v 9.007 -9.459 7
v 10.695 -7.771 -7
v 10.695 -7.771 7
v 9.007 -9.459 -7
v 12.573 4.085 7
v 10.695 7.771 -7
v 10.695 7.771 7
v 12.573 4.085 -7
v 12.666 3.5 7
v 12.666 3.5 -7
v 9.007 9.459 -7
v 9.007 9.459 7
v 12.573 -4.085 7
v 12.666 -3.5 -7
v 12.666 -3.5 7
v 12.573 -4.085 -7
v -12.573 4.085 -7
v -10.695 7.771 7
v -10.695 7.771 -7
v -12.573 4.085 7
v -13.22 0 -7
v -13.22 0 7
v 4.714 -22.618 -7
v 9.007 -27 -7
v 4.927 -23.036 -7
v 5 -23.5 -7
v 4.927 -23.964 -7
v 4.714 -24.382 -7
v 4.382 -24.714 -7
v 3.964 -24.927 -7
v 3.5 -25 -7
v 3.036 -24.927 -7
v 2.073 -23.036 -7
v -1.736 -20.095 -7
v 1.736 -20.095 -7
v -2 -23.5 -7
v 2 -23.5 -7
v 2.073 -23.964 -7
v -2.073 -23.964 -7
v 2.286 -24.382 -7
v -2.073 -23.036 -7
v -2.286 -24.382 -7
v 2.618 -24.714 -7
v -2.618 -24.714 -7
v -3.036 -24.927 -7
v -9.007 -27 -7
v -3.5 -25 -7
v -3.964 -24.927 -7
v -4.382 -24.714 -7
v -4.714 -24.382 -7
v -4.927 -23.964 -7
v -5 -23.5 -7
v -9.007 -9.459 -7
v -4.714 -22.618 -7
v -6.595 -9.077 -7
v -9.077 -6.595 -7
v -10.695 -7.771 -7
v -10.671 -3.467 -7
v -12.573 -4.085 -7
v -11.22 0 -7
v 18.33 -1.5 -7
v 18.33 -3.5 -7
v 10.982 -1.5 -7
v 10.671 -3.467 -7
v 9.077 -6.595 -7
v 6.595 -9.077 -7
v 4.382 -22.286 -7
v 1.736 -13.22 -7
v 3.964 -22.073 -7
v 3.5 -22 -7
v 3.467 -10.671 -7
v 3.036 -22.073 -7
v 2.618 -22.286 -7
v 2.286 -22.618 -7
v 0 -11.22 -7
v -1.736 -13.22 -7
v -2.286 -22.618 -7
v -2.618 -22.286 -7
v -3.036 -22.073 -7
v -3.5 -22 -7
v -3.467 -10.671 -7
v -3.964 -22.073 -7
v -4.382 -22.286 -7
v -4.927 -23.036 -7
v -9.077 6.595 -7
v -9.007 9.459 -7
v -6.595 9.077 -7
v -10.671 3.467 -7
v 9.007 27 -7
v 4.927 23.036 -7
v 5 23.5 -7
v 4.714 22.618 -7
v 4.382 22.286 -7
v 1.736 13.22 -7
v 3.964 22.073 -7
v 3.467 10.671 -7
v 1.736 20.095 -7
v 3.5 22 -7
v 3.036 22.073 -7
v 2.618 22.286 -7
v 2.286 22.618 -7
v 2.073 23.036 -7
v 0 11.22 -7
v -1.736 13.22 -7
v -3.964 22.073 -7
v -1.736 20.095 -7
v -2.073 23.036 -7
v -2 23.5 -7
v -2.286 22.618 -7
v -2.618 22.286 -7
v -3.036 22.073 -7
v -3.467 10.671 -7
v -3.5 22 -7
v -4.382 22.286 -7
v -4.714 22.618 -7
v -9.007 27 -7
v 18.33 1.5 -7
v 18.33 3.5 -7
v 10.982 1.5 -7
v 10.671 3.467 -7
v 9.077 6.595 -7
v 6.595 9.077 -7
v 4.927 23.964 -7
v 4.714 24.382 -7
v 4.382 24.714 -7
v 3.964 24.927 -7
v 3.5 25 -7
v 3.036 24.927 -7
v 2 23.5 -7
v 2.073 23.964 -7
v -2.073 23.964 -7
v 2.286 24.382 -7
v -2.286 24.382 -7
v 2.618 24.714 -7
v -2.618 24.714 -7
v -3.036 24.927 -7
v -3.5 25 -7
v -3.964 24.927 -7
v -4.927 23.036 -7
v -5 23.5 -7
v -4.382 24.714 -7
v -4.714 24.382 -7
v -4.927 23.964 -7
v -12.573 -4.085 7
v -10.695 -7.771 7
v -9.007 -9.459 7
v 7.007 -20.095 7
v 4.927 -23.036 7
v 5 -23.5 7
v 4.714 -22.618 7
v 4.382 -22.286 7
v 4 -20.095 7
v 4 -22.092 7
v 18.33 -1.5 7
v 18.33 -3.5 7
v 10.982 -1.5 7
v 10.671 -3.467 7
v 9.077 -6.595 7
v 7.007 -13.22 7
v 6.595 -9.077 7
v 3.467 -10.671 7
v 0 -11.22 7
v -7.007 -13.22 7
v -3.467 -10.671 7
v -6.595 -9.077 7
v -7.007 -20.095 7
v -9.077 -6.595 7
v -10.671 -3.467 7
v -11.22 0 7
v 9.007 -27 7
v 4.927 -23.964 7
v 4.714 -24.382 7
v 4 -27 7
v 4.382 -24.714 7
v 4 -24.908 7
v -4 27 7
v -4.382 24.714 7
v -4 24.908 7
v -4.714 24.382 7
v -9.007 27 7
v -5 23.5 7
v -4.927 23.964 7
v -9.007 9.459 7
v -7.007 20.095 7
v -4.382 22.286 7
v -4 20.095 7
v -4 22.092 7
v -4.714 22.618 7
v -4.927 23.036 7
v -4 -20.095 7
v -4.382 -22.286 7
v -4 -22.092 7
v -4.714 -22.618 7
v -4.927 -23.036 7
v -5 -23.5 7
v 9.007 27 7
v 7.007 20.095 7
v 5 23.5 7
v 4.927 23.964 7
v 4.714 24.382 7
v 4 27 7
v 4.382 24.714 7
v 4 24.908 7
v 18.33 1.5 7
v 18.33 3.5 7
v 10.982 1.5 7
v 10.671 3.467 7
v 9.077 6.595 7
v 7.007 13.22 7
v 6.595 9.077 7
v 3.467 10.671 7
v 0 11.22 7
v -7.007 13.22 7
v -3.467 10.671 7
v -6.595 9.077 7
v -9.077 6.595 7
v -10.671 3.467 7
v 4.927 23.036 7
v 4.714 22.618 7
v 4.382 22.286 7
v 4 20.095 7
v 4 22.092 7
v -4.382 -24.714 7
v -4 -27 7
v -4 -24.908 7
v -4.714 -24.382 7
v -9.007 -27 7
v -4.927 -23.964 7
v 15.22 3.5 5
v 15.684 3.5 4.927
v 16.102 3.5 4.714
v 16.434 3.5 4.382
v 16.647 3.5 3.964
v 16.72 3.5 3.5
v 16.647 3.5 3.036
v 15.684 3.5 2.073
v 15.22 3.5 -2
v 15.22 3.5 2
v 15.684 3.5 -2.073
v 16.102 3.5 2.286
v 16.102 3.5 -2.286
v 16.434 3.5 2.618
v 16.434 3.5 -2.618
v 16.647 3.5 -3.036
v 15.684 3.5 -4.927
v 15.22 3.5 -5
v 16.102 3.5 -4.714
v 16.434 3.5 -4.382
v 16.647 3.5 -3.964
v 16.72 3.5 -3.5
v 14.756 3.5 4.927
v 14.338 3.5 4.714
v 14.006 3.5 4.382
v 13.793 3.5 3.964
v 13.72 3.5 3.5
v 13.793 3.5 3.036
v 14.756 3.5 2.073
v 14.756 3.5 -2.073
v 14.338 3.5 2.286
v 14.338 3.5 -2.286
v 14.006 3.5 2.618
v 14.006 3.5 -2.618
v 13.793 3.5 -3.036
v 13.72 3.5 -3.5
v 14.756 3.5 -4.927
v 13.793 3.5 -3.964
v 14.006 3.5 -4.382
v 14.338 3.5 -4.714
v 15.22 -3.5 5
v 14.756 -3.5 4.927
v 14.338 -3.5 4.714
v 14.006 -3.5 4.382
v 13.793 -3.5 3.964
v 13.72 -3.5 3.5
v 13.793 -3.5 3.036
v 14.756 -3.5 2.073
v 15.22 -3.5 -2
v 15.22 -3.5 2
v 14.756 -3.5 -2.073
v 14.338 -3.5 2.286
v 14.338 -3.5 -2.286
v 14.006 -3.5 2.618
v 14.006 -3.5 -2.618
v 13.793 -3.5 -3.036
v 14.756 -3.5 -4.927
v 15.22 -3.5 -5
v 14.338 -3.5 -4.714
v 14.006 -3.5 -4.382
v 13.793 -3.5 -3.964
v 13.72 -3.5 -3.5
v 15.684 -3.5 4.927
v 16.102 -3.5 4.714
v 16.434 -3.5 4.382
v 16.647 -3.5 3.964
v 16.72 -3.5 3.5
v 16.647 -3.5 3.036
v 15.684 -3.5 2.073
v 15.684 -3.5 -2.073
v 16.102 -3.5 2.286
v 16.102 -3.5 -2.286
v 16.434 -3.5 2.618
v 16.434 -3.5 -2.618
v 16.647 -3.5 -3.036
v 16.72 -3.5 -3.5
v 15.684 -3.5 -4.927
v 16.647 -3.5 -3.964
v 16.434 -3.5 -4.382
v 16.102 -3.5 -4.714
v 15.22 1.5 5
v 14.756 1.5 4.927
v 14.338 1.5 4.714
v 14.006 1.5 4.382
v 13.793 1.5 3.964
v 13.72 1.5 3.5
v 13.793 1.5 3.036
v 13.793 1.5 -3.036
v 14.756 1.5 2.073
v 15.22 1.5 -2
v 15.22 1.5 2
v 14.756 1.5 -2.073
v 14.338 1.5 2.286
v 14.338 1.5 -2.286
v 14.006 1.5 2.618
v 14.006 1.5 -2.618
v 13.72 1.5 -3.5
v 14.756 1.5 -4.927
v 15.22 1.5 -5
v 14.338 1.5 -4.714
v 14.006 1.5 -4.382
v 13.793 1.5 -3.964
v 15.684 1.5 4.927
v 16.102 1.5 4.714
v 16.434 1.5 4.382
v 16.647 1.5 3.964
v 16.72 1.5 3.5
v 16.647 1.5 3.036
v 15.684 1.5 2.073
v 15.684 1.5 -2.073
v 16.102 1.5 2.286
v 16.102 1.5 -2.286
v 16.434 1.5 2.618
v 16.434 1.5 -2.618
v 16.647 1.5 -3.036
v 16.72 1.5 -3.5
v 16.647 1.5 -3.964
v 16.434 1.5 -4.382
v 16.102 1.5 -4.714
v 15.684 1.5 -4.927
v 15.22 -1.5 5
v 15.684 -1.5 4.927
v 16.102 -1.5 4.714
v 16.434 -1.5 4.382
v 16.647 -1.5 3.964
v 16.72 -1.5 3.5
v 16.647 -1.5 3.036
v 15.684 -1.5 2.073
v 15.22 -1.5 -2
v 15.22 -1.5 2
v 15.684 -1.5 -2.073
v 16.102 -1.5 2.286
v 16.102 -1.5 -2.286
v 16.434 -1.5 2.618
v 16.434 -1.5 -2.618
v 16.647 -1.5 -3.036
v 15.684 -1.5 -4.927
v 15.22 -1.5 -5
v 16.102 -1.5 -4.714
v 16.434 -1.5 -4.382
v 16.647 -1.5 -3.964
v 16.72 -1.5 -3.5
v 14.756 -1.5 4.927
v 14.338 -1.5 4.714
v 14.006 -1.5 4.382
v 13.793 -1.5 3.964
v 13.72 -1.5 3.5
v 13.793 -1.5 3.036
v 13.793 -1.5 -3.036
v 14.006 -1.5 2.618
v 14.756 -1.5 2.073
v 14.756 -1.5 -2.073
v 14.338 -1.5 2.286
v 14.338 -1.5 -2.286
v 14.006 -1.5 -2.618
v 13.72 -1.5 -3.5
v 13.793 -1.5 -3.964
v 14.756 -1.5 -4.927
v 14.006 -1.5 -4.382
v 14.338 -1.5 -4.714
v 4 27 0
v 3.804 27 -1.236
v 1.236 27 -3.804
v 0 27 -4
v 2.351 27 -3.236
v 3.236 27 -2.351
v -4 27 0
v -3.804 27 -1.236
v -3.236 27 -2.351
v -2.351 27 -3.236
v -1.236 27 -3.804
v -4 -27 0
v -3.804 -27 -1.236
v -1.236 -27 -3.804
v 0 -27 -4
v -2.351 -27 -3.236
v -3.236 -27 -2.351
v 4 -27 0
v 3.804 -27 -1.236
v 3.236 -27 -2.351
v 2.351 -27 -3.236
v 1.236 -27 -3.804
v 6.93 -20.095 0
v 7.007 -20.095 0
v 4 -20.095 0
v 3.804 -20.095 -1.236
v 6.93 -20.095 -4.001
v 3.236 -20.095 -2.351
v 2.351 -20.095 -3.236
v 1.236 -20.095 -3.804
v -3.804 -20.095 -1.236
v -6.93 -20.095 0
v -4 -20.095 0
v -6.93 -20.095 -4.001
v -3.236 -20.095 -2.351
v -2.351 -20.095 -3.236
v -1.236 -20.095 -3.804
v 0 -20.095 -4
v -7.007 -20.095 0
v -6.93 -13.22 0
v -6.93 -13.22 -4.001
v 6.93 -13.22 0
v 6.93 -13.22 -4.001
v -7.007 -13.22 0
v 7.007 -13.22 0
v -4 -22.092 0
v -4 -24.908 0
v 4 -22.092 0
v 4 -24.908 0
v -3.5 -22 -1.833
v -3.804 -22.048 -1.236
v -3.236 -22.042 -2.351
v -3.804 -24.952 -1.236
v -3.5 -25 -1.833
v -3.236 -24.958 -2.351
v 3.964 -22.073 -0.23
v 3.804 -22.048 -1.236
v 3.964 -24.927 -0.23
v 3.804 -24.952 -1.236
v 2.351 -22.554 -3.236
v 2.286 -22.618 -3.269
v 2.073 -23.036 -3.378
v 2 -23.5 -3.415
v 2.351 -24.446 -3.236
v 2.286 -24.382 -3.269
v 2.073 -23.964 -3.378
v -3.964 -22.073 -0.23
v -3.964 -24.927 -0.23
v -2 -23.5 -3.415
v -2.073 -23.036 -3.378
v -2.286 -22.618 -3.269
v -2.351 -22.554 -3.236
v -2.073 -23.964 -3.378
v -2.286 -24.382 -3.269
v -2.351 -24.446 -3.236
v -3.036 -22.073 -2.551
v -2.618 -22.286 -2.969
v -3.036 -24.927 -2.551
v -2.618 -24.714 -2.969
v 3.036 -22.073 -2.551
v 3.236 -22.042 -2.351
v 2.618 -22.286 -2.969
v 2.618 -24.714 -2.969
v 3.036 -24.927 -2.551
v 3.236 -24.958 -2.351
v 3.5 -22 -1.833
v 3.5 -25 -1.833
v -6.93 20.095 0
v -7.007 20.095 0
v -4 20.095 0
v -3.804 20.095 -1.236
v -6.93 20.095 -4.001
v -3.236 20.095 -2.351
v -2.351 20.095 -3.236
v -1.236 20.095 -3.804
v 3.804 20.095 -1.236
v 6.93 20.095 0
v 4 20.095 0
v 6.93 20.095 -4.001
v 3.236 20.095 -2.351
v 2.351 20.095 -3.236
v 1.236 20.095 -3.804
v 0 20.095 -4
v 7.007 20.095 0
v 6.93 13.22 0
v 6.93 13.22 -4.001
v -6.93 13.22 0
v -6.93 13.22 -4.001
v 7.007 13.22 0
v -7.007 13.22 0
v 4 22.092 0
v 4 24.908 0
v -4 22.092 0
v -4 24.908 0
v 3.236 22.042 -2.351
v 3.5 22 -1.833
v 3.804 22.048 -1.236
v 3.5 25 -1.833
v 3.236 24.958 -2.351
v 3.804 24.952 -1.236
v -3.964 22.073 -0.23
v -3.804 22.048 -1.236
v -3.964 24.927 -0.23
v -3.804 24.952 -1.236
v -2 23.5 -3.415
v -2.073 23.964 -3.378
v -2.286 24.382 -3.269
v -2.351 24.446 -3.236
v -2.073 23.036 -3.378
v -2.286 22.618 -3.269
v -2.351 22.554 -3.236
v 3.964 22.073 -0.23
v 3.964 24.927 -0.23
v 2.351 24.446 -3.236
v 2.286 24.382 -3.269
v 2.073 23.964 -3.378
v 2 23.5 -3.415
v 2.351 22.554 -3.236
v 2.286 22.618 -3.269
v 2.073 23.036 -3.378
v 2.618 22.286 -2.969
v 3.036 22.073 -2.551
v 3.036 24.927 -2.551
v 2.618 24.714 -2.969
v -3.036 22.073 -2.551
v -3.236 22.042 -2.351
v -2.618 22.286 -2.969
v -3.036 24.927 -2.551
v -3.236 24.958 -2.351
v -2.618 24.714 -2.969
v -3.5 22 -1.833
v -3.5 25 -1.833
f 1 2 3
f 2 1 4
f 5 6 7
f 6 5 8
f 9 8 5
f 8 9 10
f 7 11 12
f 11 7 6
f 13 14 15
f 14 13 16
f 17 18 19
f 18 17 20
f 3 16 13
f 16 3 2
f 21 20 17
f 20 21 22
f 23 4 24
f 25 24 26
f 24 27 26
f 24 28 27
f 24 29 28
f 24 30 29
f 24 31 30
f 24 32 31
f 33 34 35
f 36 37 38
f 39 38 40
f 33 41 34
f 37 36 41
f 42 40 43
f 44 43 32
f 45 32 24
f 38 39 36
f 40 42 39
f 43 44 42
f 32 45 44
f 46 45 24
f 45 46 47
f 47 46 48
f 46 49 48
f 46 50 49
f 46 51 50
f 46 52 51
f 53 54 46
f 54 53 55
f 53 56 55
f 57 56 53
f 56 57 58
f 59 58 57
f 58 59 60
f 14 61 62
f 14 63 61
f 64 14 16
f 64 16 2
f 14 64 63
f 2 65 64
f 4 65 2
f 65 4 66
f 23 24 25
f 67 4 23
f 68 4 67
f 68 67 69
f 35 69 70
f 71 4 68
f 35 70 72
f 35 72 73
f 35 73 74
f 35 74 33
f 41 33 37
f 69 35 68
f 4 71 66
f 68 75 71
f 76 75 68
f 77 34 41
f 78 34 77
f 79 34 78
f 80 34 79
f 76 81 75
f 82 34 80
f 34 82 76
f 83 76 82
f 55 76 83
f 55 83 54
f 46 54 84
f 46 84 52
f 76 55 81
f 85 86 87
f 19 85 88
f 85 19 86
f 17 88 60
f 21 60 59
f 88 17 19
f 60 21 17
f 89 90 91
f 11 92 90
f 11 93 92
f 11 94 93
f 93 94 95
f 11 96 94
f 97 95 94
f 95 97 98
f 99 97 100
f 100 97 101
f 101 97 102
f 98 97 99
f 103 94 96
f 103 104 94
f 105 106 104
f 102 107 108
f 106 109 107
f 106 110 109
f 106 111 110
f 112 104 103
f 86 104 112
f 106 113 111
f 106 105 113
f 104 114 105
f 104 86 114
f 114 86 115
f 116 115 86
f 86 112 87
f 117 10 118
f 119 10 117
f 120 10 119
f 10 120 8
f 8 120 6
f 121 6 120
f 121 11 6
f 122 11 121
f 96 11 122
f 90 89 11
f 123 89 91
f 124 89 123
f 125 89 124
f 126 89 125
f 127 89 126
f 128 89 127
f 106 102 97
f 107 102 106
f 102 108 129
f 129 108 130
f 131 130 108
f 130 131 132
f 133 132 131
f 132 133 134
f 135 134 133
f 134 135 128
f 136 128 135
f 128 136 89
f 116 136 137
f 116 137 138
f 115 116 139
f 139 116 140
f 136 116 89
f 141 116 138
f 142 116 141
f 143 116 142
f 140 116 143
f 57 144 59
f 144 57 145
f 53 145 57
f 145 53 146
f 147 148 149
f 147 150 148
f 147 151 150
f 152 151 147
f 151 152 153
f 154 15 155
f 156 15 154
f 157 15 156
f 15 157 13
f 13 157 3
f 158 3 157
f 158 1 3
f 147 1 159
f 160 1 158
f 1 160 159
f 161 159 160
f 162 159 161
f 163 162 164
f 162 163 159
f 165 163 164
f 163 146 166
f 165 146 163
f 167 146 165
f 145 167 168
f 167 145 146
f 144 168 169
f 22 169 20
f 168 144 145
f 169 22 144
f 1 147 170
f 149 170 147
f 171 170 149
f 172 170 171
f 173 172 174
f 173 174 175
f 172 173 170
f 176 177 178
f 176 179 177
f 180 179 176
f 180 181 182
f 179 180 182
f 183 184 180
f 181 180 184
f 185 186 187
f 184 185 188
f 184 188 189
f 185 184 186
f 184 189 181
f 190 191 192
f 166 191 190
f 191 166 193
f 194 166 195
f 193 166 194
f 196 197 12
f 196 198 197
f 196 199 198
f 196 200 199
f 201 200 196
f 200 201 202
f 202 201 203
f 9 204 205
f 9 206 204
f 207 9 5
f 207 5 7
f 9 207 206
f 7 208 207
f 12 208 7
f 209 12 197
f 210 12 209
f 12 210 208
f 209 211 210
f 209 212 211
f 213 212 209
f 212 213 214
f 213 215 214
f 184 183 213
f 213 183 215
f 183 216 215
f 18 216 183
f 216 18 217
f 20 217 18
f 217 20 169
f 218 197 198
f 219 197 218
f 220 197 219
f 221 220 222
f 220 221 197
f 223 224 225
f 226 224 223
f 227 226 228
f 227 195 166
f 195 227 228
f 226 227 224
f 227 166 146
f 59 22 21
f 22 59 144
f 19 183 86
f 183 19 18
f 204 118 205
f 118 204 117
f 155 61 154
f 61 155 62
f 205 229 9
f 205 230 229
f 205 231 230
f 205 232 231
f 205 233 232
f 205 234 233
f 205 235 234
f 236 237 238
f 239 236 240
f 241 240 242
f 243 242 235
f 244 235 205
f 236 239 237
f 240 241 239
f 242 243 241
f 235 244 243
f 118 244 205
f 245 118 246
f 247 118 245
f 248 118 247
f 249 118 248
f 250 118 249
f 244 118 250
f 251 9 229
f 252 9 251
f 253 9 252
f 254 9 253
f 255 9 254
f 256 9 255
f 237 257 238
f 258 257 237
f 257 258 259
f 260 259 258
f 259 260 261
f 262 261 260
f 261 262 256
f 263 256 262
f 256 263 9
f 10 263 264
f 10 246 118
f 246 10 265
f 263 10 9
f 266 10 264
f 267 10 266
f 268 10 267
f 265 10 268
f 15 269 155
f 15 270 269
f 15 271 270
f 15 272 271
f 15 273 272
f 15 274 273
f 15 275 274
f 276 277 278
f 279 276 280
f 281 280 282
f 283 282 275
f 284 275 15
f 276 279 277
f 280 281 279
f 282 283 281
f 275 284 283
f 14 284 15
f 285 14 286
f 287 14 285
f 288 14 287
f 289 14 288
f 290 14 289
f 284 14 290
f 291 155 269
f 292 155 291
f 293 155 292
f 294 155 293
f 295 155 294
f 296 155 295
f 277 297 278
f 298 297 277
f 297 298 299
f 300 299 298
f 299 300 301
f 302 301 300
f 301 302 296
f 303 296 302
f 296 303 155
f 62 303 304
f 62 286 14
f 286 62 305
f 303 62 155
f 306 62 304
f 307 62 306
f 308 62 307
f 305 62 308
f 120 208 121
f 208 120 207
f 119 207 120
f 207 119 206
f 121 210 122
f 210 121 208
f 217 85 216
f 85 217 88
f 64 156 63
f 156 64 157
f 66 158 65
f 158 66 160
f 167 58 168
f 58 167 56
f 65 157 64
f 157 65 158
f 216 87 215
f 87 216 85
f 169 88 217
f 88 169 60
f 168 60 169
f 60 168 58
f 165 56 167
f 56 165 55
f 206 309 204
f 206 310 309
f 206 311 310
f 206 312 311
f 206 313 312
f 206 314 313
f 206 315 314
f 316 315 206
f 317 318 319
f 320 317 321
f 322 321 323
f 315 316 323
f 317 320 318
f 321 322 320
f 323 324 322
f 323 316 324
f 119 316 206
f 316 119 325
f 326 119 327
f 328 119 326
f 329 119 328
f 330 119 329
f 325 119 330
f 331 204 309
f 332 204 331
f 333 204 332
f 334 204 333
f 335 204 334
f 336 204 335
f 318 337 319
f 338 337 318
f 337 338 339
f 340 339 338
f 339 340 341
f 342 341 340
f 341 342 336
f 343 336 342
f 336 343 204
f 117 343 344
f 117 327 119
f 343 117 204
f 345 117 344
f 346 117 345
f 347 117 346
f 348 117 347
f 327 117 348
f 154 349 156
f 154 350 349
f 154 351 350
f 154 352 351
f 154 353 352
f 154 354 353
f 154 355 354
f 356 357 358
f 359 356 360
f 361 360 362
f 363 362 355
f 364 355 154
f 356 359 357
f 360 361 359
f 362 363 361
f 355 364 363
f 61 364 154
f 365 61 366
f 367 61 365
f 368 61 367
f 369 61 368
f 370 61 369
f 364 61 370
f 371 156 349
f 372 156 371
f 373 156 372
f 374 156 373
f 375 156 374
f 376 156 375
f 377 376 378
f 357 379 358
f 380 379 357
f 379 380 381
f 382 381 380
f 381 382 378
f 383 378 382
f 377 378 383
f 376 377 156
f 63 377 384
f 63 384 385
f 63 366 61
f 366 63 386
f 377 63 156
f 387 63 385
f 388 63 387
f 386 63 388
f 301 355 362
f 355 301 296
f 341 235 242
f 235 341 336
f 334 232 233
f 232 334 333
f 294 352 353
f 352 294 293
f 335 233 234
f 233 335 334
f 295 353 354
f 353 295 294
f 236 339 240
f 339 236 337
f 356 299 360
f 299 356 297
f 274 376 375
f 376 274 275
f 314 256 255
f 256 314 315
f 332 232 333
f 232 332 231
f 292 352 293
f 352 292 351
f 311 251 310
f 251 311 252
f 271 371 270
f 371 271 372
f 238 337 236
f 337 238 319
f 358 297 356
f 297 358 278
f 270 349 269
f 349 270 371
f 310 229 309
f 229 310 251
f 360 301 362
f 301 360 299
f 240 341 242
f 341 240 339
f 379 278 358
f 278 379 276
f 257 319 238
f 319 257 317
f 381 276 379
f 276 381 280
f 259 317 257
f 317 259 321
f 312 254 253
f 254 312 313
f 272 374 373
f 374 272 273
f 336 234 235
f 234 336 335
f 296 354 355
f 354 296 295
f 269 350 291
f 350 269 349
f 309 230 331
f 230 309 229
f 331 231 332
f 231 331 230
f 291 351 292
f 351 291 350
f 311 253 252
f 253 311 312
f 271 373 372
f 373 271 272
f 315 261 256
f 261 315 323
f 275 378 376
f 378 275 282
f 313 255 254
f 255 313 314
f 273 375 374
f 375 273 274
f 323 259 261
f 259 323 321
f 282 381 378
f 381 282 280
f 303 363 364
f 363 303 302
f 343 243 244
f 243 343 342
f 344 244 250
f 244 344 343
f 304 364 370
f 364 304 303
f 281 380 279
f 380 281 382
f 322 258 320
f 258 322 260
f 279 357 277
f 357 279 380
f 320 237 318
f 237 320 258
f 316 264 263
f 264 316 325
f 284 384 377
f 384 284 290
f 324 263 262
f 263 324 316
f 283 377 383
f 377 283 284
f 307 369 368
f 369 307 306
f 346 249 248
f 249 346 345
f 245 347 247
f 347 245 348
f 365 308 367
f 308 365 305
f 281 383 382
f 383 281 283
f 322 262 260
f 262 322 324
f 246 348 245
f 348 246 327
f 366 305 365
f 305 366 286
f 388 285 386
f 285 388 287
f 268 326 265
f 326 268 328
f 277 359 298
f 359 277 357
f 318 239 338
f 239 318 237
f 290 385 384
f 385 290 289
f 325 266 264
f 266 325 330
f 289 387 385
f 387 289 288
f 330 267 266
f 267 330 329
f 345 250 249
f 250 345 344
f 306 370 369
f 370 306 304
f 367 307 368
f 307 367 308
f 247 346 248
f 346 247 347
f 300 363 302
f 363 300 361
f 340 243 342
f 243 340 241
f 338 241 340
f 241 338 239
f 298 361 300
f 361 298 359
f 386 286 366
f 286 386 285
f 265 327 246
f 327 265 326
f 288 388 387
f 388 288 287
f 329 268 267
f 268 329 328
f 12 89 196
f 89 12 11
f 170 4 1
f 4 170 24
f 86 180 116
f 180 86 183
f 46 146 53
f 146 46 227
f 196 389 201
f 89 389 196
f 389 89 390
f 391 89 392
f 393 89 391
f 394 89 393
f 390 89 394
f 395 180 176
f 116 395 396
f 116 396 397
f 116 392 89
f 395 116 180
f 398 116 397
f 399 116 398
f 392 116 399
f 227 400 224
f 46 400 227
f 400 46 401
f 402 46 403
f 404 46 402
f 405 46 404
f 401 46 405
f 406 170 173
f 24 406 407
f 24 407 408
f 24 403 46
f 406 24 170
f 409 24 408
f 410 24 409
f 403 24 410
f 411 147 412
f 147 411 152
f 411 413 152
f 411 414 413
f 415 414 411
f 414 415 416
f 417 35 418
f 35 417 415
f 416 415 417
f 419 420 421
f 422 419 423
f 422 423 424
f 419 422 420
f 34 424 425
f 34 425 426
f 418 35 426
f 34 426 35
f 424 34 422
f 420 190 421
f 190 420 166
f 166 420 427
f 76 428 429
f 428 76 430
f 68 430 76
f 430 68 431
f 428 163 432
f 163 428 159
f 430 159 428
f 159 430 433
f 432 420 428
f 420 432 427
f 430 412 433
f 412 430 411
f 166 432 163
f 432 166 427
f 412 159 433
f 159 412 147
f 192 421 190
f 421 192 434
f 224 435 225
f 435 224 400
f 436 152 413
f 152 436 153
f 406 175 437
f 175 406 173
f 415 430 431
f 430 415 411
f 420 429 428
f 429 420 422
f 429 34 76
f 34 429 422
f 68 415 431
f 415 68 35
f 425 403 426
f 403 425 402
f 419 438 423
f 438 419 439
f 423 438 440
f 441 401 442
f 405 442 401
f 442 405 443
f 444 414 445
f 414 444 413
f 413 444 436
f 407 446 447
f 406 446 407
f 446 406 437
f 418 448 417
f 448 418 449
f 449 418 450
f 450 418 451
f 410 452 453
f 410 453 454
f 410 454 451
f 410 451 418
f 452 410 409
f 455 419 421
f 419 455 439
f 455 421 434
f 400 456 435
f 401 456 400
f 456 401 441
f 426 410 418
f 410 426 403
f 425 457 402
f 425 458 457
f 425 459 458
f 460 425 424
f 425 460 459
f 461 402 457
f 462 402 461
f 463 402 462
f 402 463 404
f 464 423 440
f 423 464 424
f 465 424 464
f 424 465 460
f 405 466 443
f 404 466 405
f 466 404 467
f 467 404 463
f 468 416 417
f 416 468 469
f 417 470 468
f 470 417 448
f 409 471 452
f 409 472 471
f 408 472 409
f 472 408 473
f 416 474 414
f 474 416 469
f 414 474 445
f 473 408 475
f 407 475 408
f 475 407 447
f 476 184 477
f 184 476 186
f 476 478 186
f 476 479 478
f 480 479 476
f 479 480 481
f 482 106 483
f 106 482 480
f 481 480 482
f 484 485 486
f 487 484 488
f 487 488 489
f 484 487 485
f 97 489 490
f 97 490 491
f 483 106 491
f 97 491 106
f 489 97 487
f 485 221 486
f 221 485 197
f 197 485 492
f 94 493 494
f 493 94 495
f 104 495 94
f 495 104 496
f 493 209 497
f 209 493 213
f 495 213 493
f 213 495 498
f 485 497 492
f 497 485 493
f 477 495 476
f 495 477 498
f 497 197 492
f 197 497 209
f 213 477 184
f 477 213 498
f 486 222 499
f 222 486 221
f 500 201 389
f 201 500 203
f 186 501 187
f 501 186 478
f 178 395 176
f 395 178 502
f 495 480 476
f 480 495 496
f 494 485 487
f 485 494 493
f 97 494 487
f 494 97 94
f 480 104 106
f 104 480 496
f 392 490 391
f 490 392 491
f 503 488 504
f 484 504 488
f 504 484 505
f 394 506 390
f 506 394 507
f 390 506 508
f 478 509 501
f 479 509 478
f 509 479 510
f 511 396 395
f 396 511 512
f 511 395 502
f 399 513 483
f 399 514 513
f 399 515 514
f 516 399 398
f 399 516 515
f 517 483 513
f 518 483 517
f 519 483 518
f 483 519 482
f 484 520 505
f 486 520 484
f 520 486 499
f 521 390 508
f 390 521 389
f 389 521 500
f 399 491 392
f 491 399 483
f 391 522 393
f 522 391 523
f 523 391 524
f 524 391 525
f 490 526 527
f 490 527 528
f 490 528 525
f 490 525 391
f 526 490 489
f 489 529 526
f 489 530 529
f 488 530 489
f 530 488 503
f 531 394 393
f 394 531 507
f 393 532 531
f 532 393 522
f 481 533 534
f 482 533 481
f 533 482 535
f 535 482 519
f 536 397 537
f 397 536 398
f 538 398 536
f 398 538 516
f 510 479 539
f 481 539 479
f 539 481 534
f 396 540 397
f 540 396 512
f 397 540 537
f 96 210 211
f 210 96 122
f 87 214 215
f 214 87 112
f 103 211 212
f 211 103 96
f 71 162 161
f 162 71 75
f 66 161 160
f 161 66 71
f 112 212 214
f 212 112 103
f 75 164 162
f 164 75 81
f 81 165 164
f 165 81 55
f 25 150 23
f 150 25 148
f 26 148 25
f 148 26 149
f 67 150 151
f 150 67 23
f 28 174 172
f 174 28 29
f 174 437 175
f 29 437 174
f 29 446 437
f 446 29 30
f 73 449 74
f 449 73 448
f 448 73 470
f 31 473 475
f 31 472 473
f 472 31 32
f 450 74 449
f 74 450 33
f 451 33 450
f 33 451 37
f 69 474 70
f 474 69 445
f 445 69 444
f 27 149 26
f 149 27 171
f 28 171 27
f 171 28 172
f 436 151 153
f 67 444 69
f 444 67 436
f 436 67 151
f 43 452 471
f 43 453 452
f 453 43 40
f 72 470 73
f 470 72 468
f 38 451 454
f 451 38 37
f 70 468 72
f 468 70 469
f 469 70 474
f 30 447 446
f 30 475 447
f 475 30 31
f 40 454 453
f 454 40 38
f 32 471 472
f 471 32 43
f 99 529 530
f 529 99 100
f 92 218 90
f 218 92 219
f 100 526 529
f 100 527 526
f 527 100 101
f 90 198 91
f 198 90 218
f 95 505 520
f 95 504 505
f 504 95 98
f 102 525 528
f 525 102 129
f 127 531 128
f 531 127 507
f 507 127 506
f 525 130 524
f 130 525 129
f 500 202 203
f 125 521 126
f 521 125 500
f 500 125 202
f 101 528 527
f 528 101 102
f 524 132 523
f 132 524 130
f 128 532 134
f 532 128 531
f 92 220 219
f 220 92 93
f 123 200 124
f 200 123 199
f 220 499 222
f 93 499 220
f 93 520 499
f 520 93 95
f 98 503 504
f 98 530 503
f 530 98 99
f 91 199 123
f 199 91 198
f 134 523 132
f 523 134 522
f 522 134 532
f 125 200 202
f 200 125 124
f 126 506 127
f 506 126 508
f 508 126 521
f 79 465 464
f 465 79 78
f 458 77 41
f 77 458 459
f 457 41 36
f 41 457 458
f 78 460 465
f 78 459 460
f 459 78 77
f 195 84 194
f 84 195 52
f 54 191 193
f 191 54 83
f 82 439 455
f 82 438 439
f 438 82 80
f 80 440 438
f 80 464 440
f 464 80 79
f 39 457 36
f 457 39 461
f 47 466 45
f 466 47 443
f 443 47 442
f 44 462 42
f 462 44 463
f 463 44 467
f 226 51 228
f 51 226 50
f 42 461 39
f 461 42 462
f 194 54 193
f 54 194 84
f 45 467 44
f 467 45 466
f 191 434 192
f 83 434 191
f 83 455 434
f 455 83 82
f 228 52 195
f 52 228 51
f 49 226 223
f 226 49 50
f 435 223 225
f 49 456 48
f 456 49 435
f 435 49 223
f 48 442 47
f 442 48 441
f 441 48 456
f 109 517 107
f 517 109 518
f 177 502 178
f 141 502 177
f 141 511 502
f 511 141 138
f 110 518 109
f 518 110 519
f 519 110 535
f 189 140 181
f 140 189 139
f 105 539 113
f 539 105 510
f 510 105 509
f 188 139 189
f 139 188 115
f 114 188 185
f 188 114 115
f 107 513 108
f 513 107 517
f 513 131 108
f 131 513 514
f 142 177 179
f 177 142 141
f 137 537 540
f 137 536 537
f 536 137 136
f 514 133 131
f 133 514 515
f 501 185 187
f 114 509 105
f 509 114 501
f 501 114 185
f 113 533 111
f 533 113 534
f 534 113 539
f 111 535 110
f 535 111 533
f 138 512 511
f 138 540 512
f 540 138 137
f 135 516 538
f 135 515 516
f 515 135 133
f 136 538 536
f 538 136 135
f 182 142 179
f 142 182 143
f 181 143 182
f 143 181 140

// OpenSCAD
// file: joystick_4_way_hat_mk1.scad
/*
	OpenJoystick - A project creating affordable, open source, 3D-printable custom flight-sim joysticks for everyone
	Copyright (C) 2012 Travis John Howse

	This program is free software: you can redistribute it and/or modify
	it under the terms of the GNU General Public License as published by
	the Free Software Foundation, either version 3 of the License, or
	(at your option) any later version.

	This program is distributed in the hope that it will be useful,
	but WITHOUT ANY WARRANTY; without even the implied warranty of
	MERCHANTABILITY or FITNESS FOR A PARTICULAR PURPOSE.  See the
	GNU General Public License for more details.

	You should have received a copy of the GNU General Public License
	along with this program.  If not, see <http://www.gnu.org/licenses/>.
*/

include <joystick_defines.scad>

// See joystick_defines for most of the guts.

//translate([0,0,10])
//	4_way_hat_washer();
//translate([0,0,13])
//	switch_hat_saddle();
//  switch_hat_hanoi();
//pb(1);

module hat_base(numDirs)
{
	difference()
	{
		cylinder(r=(4_way_hat_base_dia/2), h=4_way_hat_base_z, $fn=circle_faces);
		
		translate([0,pb_total_z+(4_way_hat_base_screw_dia/2),4_way_hat_base_z-pb_xy/2+zff])
			rotate([90,0,0])
				pb(1.02,0);
		translate([0,-pb_total_z-(4_way_hat_base_screw_dia/2),4_way_hat_base_z-pb_xy/2+zff])
			rotate([-90,180,0])
				pb(1.02,0);
		if (numDirs==4)
		{
			translate([pb_total_z+(4_way_hat_base_screw_dia/2),0,4_way_hat_base_z-pb_xy/2+zff])
				rotate([90,0,-90])
					pb(1.02,0);
			translate([-pb_total_z-(4_way_hat_base_screw_dia/2),0,4_way_hat_base_z-pb_xy/2+zff])
				rotate([-90,180,-90])
					pb(1.02,0);
//			// Now chop the bit out of the middle
			translate([0,0,4_way_hat_base_base_z+zff])
				//cube([4_way_hat_base_screw_dia+2*pb_btn_z+zff,4_way_hat_base_screw_dia+2*pb_btn_z+zff,10],center=true);
                cylinder(r=sqrt(pow((pb_btn_dia/2),2) + pow((4_way_hat_base_screw_dia/2+pb_btn_z),2)),h=10,$fn=circle_faces);
		} else	{
			// Now chop the bit out of the middle
			translate([0,0,4_way_hat_base_base_z+5])
				cube([4_way_hat_base_screw_dia,4_way_hat_base_screw_dia+2*pb_btn_z+zff,10],center=true);
		}

		// Now chop the bit out of the middle
		/*translate([0,0,4_way_hat_base_base_z+5])
			cube([pb_xy+zff,pb_xy+zff,10],center=true);*/

		// Screw
		translate([0,0,-1])
            union()
            {
                rotate([0,5,0]) cylinder(r=4_way_hat_base_screw_dia/2, h=4_way_hat_base_z*1, $fn=circle_faces);
                rotate([0,-5,0]) cylinder(r=4_way_hat_base_screw_dia/2, h=4_way_hat_base_z*1, $fn=circle_faces);
                rotate([5,0,0]) cylinder(r=4_way_hat_base_screw_dia/2, h=4_way_hat_base_z*1, $fn=circle_faces);
                rotate([-5,0,0]) cylinder(r=4_way_hat_base_screw_dia/2, h=4_way_hat_base_z*1, $fn=circle_faces);
                cylinder(r=4_way_hat_base_screw_dia/2, h=4_way_hat_base_z*1, $fn=circle_faces);
            }
	}		
}

module hat_voids(numDirs)
{
	difference()
	{
		cylinder(r=4_way_hat_base_dia/2, h=4_way_hat_base_z);		
		hat_base(numDirs);
	}
}

module switch_hat_saddle()
{
	step_size = 2; // Won't really work for anything other than 2, sorry.
	num_steps = 4_way_hat_base_dia / step_size;
	switch_hat_saddle_base_depth = 4_way_hat_peg_stem_hole_z;


	union()
	{
		translate([0,0,switch_hat_saddle_base_depth])
			intersection()
			{
				cylinder(r = (4_way_hat_base_dia/2), h = 10, $fn=circle_faces);
				for (n = [0:num_steps])
				{
					translate([-(4_way_hat_base_dia/2)+n*step_size+0.25*step_size,0,0])
						cube([step_size, 4_way_hat_base_dia, abs((num_steps/2)-n)*1.5],center=true);
				}
			}
		difference()
		{
			cylinder(r = (4_way_hat_base_dia/2), h = switch_hat_saddle_base_depth, $fn=circle_faces);
			translate([0,0,-zff])
				#cylinder(r=(4_way_hat_base_screw_dia/2), h =switch_hat_saddle_base_depth, $fn=circle_faces);
		}
	}
}

module switch_hat_hanoi()
{
	
	difference()
	{
		union()
		{
			cylinder(r = (4_way_hat_base_dia/2), h = 2, $fn=circle_faces);
			translate([0,0,2])
			{
				for (n = [1:8])
				{
					cylinder(r = (4_way_hat_base_dia/2 - (n-1)), h = n*0.7, $fn=circle_faces);
				}
			}
		}
		translate([0,0,-zff])
			cylinder(r=(4_way_hat_base_screw_dia/2), h = 4_way_hat_peg_stem_hole_z, $fn=circle_faces);
	}	
}

module 4_way_hat_washer()
{
	difference()
	{
		cylinder(r=(4_way_hat_base_dia/2), h = 1, $fn=circle_faces);
		translate([0,0,-zff])
			cylinder(r=(4_way_hat_base_screw_dia/2), h = 1+2*zff, $fn=circle_faces);
	}
}

module hat_stem(height)
{
	bolt(8.5/2, 1.5, 4.5/2, height,0);
}
	
//hat_stem(11); // Face hats
hat_stem(23); // CMS
//switch_hat_hanoi();
// file: joystick_defines.scad
/*
	OpenJoystick - A project creating affordable, open source, 3D-printable custom flight-sim joysticks for everyone
	Copyright (C) 2012 Travis John Howse

	This program is free software: you can redistribute it and/or modify
	it under the terms of the GNU General Public License as published by
	the Free Software Foundation, either version 3 of the License, or
	(at your option) any later version.

	This program is distributed in the hope that it will be useful,
	but WITHOUT ANY WARRANTY; without even the implied warranty of
	MERCHANTABILITY or FITNESS FOR A PARTICULAR PURPOSE.  See the
	GNU General Public License for more details.

	You should have received a copy of the GNU General Public License
	along with this program.  If not, see <http://www.gnu.org/licenses/>.
*/

// Standard skate bearing
bearing_inside_dia = 8;
bearing_outside_dia = 22;
bearing_thickness = 7;

// Arbitrary value
shaft_dia = 16;

zff = 0.005;

extrusion_width = 0.8; // Used for single-wall support.

// Set this to 1 to translate everything to printable mode
printable_mode = 0;

// Gimbal core block sizes 
gimbal_core_x = 50;
gimbal_core_y = 30;
gimbal_core_z = gimbal_core_y;

// Gimbal frame sizes 
gimbal_frame_thickness = 10; 

circle_faces = 20;
$fn=circle_faces;

// The 1.8 is 2sin(45)ish, the maximum y on the xy plane the core can occupy
gimbal_frame_x = gimbal_core_x+2*gimbal_frame_thickness+2; // 2mm for washers
gimbal_frame_y = (gimbal_core_y * 1.8)+gimbal_frame_thickness;

// Frame is big enough to stop the core colliding at 45 degree rotation.
gimbal_frame_z = sqrt(pow(gimbal_core_z,2)/2) * 2 + 2; // 2 fudge to allow for clearance at tips.

max_angle = 45; // Not much comes off this, should probably build it in more places.

module bearing(hole,outer_puff)
{
	difference()
	{
		cylinder(h=bearing_thickness, r = (bearing_outside_dia/2)+outer_puff);

		if (hole)
		{
			translate([0,0,-zff])
				cylinder(h=9, r = (bearing_inside_dia/2));
		}
	}
}

// Hat sizes
// Note that many other settings for the hats are in their own .scad, only stuff relevant to the rest of the stick is here.
pb_xy = 6;
pb_z = 4; // Height minus pushbutton
pb_btn_z = 1;
pb_total_z = pb_z+pb_btn_z;
pb_btn_dia = 3.5;
pb_leg_x = 4;
pb_leg_y = 5;
pb_leg_z = 0.7;

lever_switch_x = 12.85;
lever_switch_y = 6.5;
lever_switch_z = 5.8;

4_way_hat_base_dia = 18;
4_way_hat_base_base_z = 1.5; // Base thickness
4_way_hat_base_z = pb_xy + 4_way_hat_base_base_z;
4_way_hat_base_screw_dia = 5;
4_way_hat_base_screw_head_dia = 8.25;
4_way_hat_base_screw_head_thk = 3;
4_way_hat_wire_gap = 3;
4_way_hat_cutout_z = 4_way_hat_base_z + 4_way_hat_base_screw_head_thk;

4_way_hat_peg_stem_hole_z = 4;

// Grip sizes
grip_height = 100;
grip_diameter = 44;
grip_clip = 33;
grip_rest_thickness = 5;
grip_rest_diameter = 80;
grip_cms_height_offset = 50;
grip_cms_offset = -5;
grip_cms_angle = 30;
grip_cms_stub_length = 40;
grip_cms_stub_diameter = 4_way_hat_base_dia;
grip_cms_twist = 15;

grip_head_offset_x = -10;
grip_head_box_x = 4_way_hat_base_dia * 2.5;
grip_head_box_y = 4_way_hat_base_dia * 2.2;
grip_head_box_z = 4_way_hat_base_dia * 2;

joystick_head_trigger_thickness = pb_xy;

my_layer_thickness = 0.35;

joystick_big_btn_height = 8;
joystick_big_btn_diameter = 8.0;
joystick_big_btn_clippyness = 3;

headbolt_x = 10.8;
headbolt_y = -9;
headbolt_z = -11;
headbolt_extra = 8;

module hat_cutout(bloat)
{
	// Very similar to a hat, but it has a cross on the bottom and a peg to indicate where the cables will be run.
	translate([0,0,-4_way_hat_wire_gap-4_way_hat_base_z])
	union()
	{
		translate([0,0,4_way_hat_wire_gap])cylinder(r=(4_way_hat_base_dia/2)*bloat,h=4_way_hat_base_z);
		
		intersection()
		{
			cylinder(r=(4_way_hat_base_dia/2)*bloat,h=4_way_hat_base_z);
			union()
			{
				cube([100, pb_xy, 10],true);
				cube([pb_xy, 100, 10],true);
			}
		}
		translate([0,0,-4_way_hat_base_screw_head_thk+4_way_hat_wire_gap]) cylinder(r=(4_way_hat_base_screw_head_dia/2),h=4_way_hat_base_screw_head_thk,$fn=circle_faces);
	}
}

module pb(puff, legdir)
{
	translate([0,0,pb_z/2])
	{
		// Puff set to 1 if you want a realistic model of a button.
		// Puff variable used for making holes in things bigger than the button size
		cube([pb_xy*puff,pb_xy*puff,pb_z*puff],center=true);
	
		// Button knob itself
		translate([0,0,pb_z/2-zff])
			cylinder(r=(pb_btn_dia/2),h=pb_btn_z,$fn=circle_faces);
	
		// Button legs
		if (legdir == 0)
		{
			translate([0,-pb_xy/2-pb_leg_y/2+zff,-pb_z/2+pb_leg_z/2+0.8])
				cube([pb_xy,pb_leg_y,pb_leg_z],center=true);
		} else {
			translate([0,-pb_xy/2+pb_leg_z/2+zff-pb_leg_z,-pb_z/2-pb_leg_y/2+0.8])
				cube([pb_xy,pb_leg_z,pb_leg_y],center=true);
		}
	}

}

module bolt(cap_r, cap_z, shaft_r, shaft_z,slot_len)
{
	// Hex head bolt for holding head together
	if (shaft_z <= slot_len)
	{
		echo("NO! Don't make the threaded length the same as the total.");
	}
	union()
	{
		cylinder(r=cap_r,h=cap_z);
		translate([0,0,cap_z]) cylinder(r=shaft_r+0.15, h=slot_len);
		translate([0,0,cap_z+slot_len]) cylinder(r=shaft_r, h=shaft_z-slot_len);
	}
}

module fillet(radius, length)
{
	translate([-zff,0,-zff]) difference()
	{
		cube([radius,length,radius]);
		translate([radius,length+zff,radius]) rotate([90,0,0]) cylinder(r=radius,h=length+2*zff);
	}
}
// main file
/*
	OpenJoystick - A project creating affordable, open source, 3D-printable custom flight-sim joysticks for everyone
	Copyright (C) 2012 Travis John Howse

	This program is free software: you can redistribute it and/or modify
	it under the terms of the GNU General Public License as published by
	the Free Software Foundation, either version 3 of the License, or
	(at your option) any later version.

	This program is distributed in the hope that it will be useful,
	but WITHOUT ANY WARRANTY; without even the implied warranty of
	MERCHANTABILITY or FITNESS FOR A PARTICULAR PURPOSE.  See the
	GNU General Public License for more details.

	You should have received a copy of the GNU General Public License
	along with this program.  If not, see <http://www.gnu.org/licenses/>.
*/

include <joystick_defines.scad>
use <joystick_handle.scad>

wall_thickness = 2;
m8_bolt_clearance = 1.1;
m8_bolt_head_z = 6.25*m8_bolt_clearance;
m8_bolt_head_min_r = 12.74/2*m8_bolt_clearance;
m8_bolt_head_max_r = 14.55/2*m8_bolt_clearance;

// These come from experimentally-discovered determined values for good springyness
// using 1.5mm spring steel piano wire.
outer_spring_pegs = 47;
inner_spring_pegs = 20;
spring_z_offset = 3.5;
spring_peg_r = 1.5;

y_cutaway_bite_r = 5;
y_cutaway_bite_stretch = 1.2;

bearing_outside_dia = 22*1.02;

y_total_z = bearing_thickness*2;	
y_total_y = (outer_spring_pegs/2+spring_peg_r+wall_thickness)*2;
y_total_x = (m8_bolt_head_min_r+wall_thickness)*2;

magnet_d = 10*1.1;
magnet_z = 5;

module m8_bolt(length,slotblock)
{
	rotate([0,0,90]) union()
	{
		cylinder(r=m8_bolt_head_max_r,h=m8_bolt_head_z,$fn=6);
		translate([0,0,m8_bolt_head_z]) cylinder(r=bearing_inside_dia/2,h=length);
		if (slotblock == 1)
		{
			translate([0,-m8_bolt_head_min_r,0]) cube([m8_bolt_head_min_r*2,m8_bolt_head_min_r*2,m8_bolt_head_z]);
			translate([0,-bearing_inside_dia/2,m8_bolt_head_z]) cube([m8_bolt_head_min_r*2,bearing_inside_dia,length]);
		}
	}
}

module y_axis()
{	
	edge_chord = 2*sqrt(pow((bearing_outside_dia+wall_thickness*2)/2,2)-pow(y_total_x/2,2));
	
	difference()
	{
		union()
		{
			bearing_clamp();
			cube([y_total_x,y_total_y,y_total_z],true);
		}
				
		translate([0,0,-y_total_z/2])cylinder(r=bearing_outside_dia/2,h=y_total_z);

		translate([0,-bearing_outside_dia/2-wall_thickness,0]) rotate([90,0,0]) m8_bolt(10,1);
		rotate([0,0,180]) translate([0,-bearing_outside_dia/2-wall_thickness,0]) rotate([90,0,0]) m8_bolt(10,1);
		
		// Spring pegs * 2
		translate([spring_z_offset,-outer_spring_pegs/2,-y_total_z/2]) cylinder(r=spring_peg_r,h=y_total_z);
		rotate([0,0,180]) translate([-spring_z_offset,-outer_spring_pegs/2,-y_total_z/2]) cylinder(r=spring_peg_r,h=y_total_z);
		translate([-spring_z_offset,-outer_spring_pegs/2,-y_total_z/2]) cylinder(r=spring_peg_r,h=y_total_z);
		rotate([0,0,180]) translate([spring_z_offset,-outer_spring_pegs/2,-y_total_z/2]) cylinder(r=spring_peg_r,h=y_total_z);
		
	}
}

module x_axis()
{	
	y_clearance = 3; // Two washers' worth
	z_clearance = 2;
	z_extra_bolt_clearance = 1;
	
	x_hole_x = y_total_z+ y_clearance;
	x_hole_y = bearing_outside_dia+wall_thickness*3 +spring_peg_r*2+z_clearance+z_extra_bolt_clearance;
	x_total_z = 15;
	
	x_total_x = x_hole_x + wall_thickness*3;
	x_total_y = x_hole_y + wall_thickness*3;
	
	shaft_length = 40;
	
	difference()
	{
		translate([0,(wall_thickness +spring_peg_r*2+z_extra_bolt_clearance)/2,0]) difference()
		{
			cube([x_total_x,x_total_y,x_total_z],true);
			cube([x_hole_x,x_hole_y,x_total_z],true);
		}
		
		rotate([0,90,0]) translate([0,0,-50]) cylinder(r=bearing_inside_dia/2,h=100);
	}
	translate([0,zff,0]) intersection ()
	{
		translate([-50,0,-x_total_z/2]) cube([100,100,x_total_z]);
		translate([0,(wall_thickness +spring_peg_r*2+z_extra_bolt_clearance)/2+x_total_y/2,0]) rotate([-90,0,0])
			difference()
			{
				cylinder(r=shaft_dia/2,h=shaft_length); // TODO make that stem_length more sensible.
				translate([-shaft_dia/4,-shaft_dia/2,0]) cube([shaft_dia/2,shaft_dia/2,shaft_length]);
			}
	}
	translate([0,(wall_thickness +spring_peg_r*2+z_extra_bolt_clearance)/2-x_total_y/2,0]) rotate([90,0,0]) difference()
	{
		cylinder(r=magnet_d/2+wall_thickness,h=wall_thickness);
		cylinder(r=magnet_d/2,h=wall_thickness);
	}
}

module bearing_clamp()
{
	y_total_z = bearing_thickness*2;
	gap = 3;
	clamp_bolt_r = spring_peg_r;

	difference()
	{
		union()
		{
			translate([0,0,-y_total_z/2]) cylinder(r=bearing_outside_dia/2+wall_thickness,h=y_total_z);
			translate([bearing_outside_dia/2-wall_thickness,0,0]) cube([wall_thickness*2+clamp_bolt_r*2+bearing_outside_dia/2, wall_thickness*2+gap,y_total_z],true);
		}
		translate([0,0,-y_total_z/2])cylinder(r=bearing_outside_dia/2,h=y_total_z);
		translate([bearing_outside_dia/2-wall_thickness,0,0]) cube([wall_thickness*2+clamp_bolt_r*2+bearing_outside_dia/2, gap,y_total_z],true);
		
		translate([bearing_outside_dia/2+wall_thickness*2,0,bearing_thickness/2]) rotate([90,0,0]) translate([0,0,-(wall_thickness*2+gap)/2]) cylinder(r=clamp_bolt_r,h=wall_thickness*2+gap);
		translate([bearing_outside_dia/2+wall_thickness*2,0,-bearing_thickness/2]) rotate([90,0,0]) translate([0,0,-(wall_thickness*2+gap)/2]) cylinder(r=clamp_bolt_r,h=wall_thickness*2+gap);
	}
}

test_x = 0;
test_y = 0;
if (0)
{
	
	rotate([test_x,test_y,0]) rotate([90,0,0]) x_axis();
	rotate([0,test_y,0]) rotate([0,270,0]) y_axis();
}
//x_axis();
y_axis();
//bearing_clamp();
//m8_bolt(10,1);
